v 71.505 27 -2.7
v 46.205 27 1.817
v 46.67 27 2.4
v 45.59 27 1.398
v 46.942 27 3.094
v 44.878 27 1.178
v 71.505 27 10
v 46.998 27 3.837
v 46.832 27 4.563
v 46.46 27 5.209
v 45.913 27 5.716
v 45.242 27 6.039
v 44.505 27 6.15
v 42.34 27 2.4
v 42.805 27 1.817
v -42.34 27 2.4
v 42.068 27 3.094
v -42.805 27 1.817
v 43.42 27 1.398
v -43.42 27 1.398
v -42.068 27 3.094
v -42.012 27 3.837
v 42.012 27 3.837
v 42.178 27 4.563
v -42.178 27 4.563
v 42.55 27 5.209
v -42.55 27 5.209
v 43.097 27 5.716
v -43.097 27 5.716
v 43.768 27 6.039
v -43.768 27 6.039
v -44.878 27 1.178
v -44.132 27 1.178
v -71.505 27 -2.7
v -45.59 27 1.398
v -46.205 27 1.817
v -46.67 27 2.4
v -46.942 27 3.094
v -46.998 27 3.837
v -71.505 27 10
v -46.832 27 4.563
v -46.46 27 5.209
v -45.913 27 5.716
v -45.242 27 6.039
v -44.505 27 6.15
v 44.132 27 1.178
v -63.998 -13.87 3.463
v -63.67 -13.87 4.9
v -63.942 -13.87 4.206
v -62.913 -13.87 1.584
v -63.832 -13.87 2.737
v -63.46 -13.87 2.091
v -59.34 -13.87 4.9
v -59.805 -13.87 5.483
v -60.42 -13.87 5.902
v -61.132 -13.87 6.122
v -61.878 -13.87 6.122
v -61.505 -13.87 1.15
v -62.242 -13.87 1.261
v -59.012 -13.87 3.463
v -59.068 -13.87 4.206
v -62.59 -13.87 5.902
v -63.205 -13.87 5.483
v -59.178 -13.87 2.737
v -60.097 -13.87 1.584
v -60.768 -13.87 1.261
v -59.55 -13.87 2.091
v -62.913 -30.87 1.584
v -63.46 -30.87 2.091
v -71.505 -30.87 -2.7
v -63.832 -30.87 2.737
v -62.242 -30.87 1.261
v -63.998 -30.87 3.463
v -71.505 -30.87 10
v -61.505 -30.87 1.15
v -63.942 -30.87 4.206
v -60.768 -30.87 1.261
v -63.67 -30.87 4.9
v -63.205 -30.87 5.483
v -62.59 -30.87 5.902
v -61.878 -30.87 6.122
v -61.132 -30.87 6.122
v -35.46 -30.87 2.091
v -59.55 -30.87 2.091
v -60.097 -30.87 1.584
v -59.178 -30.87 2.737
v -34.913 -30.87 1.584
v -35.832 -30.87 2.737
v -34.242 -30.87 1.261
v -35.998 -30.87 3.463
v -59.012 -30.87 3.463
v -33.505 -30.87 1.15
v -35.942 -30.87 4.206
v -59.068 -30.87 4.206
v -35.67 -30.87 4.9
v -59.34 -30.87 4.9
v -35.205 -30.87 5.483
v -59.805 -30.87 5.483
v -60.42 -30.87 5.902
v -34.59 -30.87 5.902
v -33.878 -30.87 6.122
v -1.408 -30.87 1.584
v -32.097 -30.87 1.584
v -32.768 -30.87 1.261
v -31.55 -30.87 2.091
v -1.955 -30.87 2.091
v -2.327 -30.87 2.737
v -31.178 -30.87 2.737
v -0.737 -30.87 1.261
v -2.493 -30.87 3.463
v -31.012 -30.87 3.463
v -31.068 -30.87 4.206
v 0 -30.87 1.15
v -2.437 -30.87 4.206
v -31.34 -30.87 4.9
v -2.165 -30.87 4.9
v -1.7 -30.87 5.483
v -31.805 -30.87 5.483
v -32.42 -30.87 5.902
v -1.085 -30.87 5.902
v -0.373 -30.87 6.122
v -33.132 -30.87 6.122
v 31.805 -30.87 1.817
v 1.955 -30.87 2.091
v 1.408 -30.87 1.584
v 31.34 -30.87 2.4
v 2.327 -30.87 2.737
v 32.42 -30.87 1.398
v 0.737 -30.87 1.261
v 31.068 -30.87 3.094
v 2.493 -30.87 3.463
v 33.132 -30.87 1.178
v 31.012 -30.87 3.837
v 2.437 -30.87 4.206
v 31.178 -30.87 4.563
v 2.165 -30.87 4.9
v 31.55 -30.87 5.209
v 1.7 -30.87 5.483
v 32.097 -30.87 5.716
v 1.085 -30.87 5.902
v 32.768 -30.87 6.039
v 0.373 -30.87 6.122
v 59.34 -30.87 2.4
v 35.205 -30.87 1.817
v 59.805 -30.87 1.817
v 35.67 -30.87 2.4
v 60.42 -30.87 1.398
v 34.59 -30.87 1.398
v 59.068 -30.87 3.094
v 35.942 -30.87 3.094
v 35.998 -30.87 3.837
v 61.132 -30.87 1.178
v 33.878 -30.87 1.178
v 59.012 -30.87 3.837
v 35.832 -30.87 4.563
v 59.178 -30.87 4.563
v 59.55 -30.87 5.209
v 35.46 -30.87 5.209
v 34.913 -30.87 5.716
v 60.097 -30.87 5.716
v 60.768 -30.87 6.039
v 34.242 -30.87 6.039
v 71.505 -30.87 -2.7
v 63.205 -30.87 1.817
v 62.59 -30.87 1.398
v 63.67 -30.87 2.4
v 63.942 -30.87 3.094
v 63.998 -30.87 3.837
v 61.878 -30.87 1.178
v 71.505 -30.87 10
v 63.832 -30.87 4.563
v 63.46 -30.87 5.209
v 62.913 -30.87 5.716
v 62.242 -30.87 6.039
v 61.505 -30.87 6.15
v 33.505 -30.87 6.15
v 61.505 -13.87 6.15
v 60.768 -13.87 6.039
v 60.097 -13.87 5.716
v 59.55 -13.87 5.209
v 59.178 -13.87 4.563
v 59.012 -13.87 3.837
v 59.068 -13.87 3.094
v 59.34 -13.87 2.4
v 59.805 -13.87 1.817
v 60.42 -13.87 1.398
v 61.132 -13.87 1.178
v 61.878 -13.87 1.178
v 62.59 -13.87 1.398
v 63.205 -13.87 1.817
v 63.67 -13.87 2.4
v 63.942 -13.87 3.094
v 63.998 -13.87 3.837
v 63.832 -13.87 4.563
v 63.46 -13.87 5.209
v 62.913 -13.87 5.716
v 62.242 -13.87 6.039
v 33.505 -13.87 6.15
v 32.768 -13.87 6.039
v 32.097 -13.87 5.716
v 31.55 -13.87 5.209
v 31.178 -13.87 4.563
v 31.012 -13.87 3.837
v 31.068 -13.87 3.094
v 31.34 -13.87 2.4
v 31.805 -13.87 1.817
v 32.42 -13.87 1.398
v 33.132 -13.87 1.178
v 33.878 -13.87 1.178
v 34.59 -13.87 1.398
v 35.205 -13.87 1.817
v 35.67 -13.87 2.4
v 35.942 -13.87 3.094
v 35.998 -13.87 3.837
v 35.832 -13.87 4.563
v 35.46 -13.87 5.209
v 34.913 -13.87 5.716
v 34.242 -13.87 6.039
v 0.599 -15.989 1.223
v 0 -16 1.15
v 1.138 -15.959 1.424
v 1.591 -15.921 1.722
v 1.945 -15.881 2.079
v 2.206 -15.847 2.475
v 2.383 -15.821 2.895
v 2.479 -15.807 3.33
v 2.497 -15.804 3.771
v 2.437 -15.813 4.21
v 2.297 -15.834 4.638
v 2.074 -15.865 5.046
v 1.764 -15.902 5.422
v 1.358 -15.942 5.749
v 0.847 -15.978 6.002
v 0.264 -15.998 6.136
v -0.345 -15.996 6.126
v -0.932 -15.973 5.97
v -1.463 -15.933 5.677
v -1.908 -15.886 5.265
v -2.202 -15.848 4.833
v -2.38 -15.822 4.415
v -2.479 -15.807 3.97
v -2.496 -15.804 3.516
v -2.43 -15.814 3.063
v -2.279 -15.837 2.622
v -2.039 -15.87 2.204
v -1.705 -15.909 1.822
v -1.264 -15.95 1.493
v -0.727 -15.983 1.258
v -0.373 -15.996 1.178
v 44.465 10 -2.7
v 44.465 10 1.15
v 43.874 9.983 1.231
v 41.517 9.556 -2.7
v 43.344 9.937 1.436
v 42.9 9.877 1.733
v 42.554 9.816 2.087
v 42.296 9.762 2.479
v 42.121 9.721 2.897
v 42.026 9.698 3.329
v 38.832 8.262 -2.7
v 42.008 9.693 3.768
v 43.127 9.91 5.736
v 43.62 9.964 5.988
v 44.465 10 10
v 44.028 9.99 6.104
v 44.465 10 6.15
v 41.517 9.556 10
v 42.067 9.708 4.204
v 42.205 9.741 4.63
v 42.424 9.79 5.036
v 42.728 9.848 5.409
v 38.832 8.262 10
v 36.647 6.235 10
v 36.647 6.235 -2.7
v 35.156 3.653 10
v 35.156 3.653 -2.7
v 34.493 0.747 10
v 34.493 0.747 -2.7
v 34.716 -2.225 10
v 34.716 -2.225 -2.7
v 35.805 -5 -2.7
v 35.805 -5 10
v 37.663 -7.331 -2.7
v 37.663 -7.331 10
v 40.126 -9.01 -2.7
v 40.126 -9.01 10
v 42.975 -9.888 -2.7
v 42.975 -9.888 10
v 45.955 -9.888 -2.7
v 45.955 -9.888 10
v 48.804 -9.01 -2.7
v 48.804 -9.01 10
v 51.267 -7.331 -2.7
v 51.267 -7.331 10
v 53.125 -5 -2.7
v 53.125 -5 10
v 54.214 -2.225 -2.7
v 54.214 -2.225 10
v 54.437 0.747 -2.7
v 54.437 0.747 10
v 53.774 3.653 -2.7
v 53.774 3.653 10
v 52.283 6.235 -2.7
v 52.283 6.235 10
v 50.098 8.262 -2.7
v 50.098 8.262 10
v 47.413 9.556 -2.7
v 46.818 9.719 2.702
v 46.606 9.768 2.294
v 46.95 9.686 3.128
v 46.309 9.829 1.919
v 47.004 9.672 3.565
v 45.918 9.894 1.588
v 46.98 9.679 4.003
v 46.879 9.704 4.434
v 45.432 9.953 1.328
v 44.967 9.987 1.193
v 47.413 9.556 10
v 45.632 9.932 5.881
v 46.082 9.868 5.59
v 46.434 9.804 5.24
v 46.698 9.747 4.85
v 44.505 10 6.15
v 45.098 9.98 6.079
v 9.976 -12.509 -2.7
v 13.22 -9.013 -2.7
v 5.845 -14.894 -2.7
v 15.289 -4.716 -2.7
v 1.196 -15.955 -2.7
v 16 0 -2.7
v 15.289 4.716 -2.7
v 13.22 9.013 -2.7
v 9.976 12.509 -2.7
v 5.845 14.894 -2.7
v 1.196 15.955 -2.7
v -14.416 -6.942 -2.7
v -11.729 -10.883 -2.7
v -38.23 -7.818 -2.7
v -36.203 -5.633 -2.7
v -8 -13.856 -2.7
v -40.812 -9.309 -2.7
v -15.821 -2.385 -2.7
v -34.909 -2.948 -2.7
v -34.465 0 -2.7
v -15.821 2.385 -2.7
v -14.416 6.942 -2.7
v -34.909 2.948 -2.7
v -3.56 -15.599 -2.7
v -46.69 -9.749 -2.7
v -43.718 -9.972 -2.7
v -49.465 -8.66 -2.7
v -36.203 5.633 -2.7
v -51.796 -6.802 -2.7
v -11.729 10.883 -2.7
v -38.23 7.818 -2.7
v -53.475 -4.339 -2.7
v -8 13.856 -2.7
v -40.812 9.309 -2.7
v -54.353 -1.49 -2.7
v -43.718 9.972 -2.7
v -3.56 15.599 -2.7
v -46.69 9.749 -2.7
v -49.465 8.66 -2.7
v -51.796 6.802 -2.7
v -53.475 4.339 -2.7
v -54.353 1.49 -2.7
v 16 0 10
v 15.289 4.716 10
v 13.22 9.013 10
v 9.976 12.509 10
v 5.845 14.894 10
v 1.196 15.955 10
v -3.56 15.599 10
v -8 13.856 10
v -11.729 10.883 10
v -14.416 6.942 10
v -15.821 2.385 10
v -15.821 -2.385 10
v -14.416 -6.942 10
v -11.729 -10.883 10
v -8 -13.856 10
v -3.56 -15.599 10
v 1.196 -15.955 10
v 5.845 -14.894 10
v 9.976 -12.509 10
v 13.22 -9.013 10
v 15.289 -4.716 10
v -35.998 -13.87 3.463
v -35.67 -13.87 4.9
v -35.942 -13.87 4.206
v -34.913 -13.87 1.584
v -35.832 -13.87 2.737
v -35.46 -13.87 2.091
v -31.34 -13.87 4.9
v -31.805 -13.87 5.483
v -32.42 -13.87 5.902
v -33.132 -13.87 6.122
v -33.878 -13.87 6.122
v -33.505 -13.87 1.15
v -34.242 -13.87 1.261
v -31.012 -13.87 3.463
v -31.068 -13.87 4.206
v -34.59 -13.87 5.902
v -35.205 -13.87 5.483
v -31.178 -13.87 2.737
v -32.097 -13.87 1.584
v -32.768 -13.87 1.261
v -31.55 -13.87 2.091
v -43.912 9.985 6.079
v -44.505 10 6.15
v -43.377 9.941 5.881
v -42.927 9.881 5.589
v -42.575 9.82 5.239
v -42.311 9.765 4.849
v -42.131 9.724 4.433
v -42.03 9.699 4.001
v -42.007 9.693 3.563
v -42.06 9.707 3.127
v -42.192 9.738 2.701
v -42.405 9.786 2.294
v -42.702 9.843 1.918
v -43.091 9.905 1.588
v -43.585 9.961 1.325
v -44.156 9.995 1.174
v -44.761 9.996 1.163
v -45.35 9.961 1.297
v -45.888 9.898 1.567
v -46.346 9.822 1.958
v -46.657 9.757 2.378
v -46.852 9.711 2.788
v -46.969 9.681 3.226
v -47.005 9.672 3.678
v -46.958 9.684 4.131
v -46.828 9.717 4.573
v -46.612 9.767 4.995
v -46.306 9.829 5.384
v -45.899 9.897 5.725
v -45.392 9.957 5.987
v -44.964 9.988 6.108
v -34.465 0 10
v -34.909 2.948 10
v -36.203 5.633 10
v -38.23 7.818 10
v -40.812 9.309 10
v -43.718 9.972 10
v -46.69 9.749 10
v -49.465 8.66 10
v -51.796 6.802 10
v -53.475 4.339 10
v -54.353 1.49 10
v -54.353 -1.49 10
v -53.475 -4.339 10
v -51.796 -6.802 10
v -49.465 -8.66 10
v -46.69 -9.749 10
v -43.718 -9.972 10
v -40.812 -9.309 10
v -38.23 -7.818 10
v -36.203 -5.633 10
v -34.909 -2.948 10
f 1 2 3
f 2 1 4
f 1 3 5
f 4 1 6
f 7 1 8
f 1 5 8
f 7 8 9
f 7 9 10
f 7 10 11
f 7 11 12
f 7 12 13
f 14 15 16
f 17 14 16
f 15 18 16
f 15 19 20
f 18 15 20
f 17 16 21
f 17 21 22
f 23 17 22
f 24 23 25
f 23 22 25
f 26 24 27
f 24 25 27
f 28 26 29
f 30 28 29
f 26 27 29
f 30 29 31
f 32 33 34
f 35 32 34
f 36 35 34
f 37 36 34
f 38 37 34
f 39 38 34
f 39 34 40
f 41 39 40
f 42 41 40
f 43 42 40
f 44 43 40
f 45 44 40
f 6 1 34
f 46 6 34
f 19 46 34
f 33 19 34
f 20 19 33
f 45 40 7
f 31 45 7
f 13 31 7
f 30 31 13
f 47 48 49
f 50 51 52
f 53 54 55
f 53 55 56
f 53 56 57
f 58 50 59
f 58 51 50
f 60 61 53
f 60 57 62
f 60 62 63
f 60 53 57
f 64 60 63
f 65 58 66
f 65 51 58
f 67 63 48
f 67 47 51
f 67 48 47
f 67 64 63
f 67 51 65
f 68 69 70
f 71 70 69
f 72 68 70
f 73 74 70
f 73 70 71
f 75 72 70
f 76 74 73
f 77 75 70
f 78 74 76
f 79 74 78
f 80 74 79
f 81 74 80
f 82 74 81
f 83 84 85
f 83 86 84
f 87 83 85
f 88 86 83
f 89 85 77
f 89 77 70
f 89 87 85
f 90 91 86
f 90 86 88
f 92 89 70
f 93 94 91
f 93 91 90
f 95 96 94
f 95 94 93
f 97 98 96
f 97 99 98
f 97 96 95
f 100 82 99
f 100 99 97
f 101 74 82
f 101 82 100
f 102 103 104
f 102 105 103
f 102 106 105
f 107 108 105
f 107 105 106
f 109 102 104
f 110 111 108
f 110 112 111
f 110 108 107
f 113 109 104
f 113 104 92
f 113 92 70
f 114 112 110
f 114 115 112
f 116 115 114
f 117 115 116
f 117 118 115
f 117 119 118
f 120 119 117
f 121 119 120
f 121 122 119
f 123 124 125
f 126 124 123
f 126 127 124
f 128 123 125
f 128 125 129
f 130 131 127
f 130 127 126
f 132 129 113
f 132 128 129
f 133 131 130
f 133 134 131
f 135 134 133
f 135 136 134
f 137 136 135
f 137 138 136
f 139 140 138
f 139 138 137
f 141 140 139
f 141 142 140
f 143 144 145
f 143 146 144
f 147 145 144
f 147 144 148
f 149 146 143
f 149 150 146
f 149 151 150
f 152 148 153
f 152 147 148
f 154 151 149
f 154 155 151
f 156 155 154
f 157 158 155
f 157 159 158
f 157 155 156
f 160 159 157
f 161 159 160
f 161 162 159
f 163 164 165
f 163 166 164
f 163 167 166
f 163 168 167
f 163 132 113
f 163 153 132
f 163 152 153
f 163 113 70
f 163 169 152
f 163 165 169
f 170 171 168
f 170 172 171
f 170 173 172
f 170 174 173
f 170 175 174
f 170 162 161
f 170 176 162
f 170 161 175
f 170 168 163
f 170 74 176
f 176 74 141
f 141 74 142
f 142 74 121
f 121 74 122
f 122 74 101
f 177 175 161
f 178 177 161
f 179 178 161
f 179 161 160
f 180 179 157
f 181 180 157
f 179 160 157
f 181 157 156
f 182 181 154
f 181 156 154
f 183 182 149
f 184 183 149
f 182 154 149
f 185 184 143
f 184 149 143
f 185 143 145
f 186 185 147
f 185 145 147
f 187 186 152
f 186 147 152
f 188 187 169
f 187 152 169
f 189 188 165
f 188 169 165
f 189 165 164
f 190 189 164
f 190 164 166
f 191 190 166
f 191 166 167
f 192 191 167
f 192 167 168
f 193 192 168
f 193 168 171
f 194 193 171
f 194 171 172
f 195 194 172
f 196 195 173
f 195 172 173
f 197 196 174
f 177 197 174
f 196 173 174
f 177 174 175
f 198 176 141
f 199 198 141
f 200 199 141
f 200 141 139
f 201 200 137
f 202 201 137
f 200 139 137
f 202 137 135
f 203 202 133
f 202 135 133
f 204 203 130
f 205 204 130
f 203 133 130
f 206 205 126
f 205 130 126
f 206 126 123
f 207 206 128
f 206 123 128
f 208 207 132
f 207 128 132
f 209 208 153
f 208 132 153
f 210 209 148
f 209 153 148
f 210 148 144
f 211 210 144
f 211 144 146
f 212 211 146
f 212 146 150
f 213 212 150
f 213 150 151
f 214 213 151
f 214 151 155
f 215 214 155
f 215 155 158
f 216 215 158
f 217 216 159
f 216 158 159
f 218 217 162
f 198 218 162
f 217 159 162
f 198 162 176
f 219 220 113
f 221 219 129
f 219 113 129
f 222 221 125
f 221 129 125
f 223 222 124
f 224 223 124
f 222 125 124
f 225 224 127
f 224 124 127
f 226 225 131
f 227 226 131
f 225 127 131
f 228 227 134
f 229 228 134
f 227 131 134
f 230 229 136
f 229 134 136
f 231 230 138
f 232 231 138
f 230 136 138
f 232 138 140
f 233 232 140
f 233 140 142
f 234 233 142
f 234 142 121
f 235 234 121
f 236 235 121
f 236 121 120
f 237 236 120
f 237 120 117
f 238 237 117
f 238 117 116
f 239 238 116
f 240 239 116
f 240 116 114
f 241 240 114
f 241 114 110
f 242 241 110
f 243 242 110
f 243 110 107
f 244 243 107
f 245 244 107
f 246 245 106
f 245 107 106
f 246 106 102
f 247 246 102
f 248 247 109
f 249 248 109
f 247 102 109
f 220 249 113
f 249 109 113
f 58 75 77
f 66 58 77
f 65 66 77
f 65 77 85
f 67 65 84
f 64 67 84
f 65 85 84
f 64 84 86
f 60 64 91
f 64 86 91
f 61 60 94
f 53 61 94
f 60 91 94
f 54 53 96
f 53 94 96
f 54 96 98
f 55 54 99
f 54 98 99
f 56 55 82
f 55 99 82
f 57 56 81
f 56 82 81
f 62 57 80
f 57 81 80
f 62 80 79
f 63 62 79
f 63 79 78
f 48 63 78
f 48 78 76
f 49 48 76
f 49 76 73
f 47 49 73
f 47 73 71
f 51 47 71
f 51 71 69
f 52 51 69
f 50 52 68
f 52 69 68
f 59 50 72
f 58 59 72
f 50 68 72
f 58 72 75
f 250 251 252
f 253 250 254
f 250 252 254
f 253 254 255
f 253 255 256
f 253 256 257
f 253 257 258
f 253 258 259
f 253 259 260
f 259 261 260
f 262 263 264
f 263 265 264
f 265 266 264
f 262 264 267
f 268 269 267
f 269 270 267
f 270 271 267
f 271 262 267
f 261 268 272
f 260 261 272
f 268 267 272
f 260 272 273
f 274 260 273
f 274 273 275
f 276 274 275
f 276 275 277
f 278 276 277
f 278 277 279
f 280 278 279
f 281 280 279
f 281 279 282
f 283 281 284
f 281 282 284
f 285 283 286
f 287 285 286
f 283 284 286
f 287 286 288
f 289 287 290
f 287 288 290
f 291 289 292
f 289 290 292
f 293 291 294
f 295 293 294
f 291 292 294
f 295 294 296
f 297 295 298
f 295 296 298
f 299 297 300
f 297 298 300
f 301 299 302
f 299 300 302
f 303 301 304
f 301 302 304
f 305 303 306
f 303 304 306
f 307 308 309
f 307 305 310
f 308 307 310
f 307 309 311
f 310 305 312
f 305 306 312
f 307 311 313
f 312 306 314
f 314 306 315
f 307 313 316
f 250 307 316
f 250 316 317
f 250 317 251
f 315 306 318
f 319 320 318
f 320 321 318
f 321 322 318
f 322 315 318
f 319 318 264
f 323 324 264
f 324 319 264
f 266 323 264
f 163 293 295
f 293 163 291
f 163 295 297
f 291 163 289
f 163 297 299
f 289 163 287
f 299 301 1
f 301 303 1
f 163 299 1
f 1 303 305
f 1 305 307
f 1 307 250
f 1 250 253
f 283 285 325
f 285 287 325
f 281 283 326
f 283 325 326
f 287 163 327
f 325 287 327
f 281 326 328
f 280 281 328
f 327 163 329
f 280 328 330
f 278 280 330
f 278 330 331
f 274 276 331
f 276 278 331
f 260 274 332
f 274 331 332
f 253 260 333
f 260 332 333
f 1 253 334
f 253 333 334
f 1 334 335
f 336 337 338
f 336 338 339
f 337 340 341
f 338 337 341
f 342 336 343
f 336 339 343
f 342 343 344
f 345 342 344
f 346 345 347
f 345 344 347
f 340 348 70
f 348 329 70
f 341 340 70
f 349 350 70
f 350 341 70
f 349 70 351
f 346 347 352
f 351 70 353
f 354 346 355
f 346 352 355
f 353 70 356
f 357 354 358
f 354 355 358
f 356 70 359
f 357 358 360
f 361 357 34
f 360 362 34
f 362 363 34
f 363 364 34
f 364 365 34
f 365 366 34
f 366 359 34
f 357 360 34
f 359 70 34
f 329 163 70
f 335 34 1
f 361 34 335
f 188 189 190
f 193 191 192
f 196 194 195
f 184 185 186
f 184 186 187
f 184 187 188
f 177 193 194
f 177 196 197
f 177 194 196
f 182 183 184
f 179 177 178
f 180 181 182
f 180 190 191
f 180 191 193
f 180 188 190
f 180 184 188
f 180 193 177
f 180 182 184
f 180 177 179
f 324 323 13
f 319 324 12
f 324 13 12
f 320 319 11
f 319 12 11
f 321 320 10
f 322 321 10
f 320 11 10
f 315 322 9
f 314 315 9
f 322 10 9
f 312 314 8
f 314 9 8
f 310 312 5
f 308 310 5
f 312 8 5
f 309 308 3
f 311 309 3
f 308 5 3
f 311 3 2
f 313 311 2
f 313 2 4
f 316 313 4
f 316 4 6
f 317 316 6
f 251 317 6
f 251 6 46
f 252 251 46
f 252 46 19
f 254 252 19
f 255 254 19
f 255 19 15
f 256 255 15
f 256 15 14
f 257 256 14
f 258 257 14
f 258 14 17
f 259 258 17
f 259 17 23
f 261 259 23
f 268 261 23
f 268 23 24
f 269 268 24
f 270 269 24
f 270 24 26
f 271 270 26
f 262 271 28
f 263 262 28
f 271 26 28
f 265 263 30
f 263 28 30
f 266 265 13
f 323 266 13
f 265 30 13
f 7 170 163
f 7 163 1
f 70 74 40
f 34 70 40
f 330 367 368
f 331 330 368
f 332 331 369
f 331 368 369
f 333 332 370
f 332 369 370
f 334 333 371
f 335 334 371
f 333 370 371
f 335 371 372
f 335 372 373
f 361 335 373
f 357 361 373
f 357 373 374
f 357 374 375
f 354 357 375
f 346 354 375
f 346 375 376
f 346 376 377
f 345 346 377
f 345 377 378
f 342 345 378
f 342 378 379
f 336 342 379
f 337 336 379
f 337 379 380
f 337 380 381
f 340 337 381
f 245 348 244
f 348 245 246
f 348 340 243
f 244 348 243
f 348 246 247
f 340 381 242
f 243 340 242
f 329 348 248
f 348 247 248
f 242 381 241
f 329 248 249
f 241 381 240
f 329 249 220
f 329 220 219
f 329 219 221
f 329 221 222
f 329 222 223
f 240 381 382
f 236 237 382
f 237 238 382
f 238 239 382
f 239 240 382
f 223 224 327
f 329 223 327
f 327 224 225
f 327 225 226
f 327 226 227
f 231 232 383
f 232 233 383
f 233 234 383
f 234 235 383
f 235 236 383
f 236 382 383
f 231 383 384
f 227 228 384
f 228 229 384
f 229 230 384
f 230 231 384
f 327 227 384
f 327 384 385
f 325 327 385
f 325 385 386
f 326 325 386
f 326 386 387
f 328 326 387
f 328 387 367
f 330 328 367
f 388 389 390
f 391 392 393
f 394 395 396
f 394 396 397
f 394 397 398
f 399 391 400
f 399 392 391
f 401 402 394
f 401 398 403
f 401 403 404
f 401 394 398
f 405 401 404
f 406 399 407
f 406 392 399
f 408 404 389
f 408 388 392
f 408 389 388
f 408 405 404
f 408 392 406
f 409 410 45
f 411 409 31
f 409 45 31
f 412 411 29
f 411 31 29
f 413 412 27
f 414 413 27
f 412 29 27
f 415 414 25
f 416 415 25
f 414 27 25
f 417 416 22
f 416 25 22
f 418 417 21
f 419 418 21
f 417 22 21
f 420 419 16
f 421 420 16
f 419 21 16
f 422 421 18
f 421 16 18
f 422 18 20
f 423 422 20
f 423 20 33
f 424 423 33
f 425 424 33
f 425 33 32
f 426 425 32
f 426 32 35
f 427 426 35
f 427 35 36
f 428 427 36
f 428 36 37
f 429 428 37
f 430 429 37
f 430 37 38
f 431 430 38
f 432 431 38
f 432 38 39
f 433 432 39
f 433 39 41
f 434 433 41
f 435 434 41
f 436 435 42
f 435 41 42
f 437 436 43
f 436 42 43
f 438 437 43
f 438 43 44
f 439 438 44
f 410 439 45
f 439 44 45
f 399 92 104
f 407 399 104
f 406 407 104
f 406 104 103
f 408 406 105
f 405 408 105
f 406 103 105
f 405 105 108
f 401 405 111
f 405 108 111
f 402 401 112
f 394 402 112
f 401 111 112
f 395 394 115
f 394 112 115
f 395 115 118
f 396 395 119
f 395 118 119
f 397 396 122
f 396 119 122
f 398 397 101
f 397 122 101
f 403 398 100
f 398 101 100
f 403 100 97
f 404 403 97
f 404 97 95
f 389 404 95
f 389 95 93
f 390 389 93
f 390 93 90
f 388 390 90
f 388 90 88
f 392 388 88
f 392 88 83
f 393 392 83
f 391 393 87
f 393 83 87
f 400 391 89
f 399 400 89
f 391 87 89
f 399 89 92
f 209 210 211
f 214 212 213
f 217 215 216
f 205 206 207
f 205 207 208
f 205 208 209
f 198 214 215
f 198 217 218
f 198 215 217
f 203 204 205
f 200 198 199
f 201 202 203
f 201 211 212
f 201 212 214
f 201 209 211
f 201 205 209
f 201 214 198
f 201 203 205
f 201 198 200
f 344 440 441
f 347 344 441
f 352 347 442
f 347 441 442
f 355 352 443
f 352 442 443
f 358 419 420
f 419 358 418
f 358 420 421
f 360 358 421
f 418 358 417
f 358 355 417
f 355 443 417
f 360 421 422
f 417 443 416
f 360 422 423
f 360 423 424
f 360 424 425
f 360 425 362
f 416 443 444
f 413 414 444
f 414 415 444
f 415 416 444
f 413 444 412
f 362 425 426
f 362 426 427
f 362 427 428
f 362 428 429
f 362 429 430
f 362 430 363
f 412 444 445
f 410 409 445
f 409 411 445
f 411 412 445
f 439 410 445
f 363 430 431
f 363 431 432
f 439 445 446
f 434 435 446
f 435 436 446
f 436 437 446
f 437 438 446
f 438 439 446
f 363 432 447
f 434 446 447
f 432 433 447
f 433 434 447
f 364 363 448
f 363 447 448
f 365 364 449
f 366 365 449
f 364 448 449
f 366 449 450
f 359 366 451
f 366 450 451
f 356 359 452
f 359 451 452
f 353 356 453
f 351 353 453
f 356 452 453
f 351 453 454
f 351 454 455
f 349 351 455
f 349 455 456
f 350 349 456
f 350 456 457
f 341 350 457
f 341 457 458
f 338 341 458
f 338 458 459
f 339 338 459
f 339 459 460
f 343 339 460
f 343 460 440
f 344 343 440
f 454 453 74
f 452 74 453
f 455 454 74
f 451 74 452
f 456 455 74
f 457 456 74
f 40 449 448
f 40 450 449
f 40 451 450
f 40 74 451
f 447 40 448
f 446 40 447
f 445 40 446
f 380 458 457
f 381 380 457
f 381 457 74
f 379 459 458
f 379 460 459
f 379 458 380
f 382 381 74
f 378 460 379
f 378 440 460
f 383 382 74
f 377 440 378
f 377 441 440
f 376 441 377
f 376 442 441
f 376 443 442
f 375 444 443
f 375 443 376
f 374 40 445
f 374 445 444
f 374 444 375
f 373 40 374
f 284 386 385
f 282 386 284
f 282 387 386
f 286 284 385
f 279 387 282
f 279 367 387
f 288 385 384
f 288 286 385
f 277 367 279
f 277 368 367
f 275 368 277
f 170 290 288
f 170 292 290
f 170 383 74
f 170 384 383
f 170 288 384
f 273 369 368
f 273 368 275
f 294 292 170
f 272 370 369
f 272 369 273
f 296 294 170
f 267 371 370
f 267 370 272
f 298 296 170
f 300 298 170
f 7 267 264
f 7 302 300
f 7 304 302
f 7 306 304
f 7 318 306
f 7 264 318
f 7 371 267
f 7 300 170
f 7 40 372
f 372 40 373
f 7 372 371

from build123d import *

# Parameters (mm, degrees)
ESBO_O1_W                = 143.01
ESBO_O1_H                = 54
RESSALTO_EXTRUS_O1_DEPTH = 10
ESBO_O14_W               = 2.7
ESBO_O14_H               = 57.87
RESSALTO_EXTRUS_O3_DEPTH = 143.01
ESBO_O2_R                = 16
CIRCULO_ROLAMENTO_DEPTH  = 19
ESBO_O7_R                = 10
CORTE_EXTRUS_O3_DEPTH    = 19
ESBO_O8_W                = 143.01
ESBO_O8_H                = 3.87
RESSALTO_EXTRUS_O2_DEPTH = 10
ESBO_O12_R               = 2.5
CORTE_EXTRUS_O6_DEPTH    = 17
CORTE_EXTRUS_O7_REACH    = 94.531
ESBO_O15_R               = 2.5


with BuildPart() as part:
    # Esboço1 → Ressalto-extrusão1 (new body)
    with BuildSketch(Plane.XY):
        Rectangle(ESBO_O1_W, ESBO_O1_H)
    extrude(amount=RESSALTO_EXTRUS_O1_DEPTH)

    # Esboço14 → Ressalto-extrusão3 (add)
    with BuildSketch(Plane.ZY.offset(71.505)):
        with Locations((-1.35, -1.935)):
            Rectangle(ESBO_O14_W, ESBO_O14_H)
    extrude(amount=-RESSALTO_EXTRUS_O3_DEPTH)

    # Esboço2 → Circulo rolamento (cut)
    with BuildSketch(Plane.XY.offset(10)):
        Circle(ESBO_O2_R)
    extrude(amount=-CIRCULO_ROLAMENTO_DEPTH, mode=Mode.SUBTRACT)

    # Esboço7 → Corte-extrusão3 (cut)
    with BuildSketch(Plane.XY.offset(10)):
        with Locations((-44.465, 0)):
            Circle(ESBO_O7_R)
        with Locations(Location((44.465, 0, 0), (0, 0, 90))):
            Circle(ESBO_O7_R)
    extrude(amount=-CORTE_EXTRUS_O3_DEPTH, mode=Mode.SUBTRACT)

    # Esboço8 → Ressalto-extrusão2 (add)
    with BuildSketch(Plane.XY.offset(10)):
        with Locations((0, -28.935)):
            Rectangle(ESBO_O8_W, ESBO_O8_H)
    extrude(amount=-RESSALTO_EXTRUS_O2_DEPTH)

    # Esboço12 → Corte-extrusão6 (cut)
    with BuildSketch(Plane.XZ.offset(30.87)):
        with Locations(Location((-61.505, 3.65, 0), (0, 0, 270))):
            Circle(ESBO_O12_R)
        with Locations(Location((61.505, 3.65, 0), (0, 0, 90))):
            Circle(ESBO_O12_R)
        with Locations(Location((0, 3.65, 0), (0, 0, 270))):
            Circle(ESBO_O12_R)
        with Locations(Location((-33.505, 3.65, 0), (0, 0, 270))):
            Circle(ESBO_O12_R)
        with Locations(Location((33.505, 3.65, 0), (0, 0, 90))):
            Circle(ESBO_O12_R)
    extrude(amount=-CORTE_EXTRUS_O6_DEPTH, mode=Mode.SUBTRACT)

    # Esboço15 → Corte-extrusão7 (cut, up to next)
    with BuildSketch(Plane(origin=(0, 27, 0), x_dir=(1, 0, 0), z_dir=(0, 1, 0)), mode=Mode.PRIVATE) as corte_extrus_o7_sk1:
        with Locations(Location((-44.505, -3.65, 0), (0, 0, 270))):
            Circle(ESBO_O15_R)
    corte_extrus_o7_tool1 = extrude(corte_extrus_o7_sk1.sketch, amount=-CORTE_EXTRUS_O7_REACH, mode=Mode.PRIVATE) & part.part
    # Esboço15 → Corte-extrusão7 (cut, up to next)
    with BuildSketch(Plane(origin=(0, 27, 0), x_dir=(1, 0, 0), z_dir=(0, 1, 0)), mode=Mode.PRIVATE) as corte_extrus_o7_sk2:
        with Locations(Location((44.505, -3.65, 0), (0, 0, 270))):
            Circle(ESBO_O15_R)
    corte_extrus_o7_tool2 = extrude(corte_extrus_o7_sk2.sketch, amount=-CORTE_EXTRUS_O7_REACH, mode=Mode.PRIVATE) & part.part
    add(corte_extrus_o7_tool1.solids().sort_by_distance((-44.505, 27, 3.65))[0], mode=Mode.SUBTRACT)
    add(corte_extrus_o7_tool2.solids().sort_by_distance((44.505, 27, 3.65))[0], mode=Mode.SUBTRACT)


solid = part.part
